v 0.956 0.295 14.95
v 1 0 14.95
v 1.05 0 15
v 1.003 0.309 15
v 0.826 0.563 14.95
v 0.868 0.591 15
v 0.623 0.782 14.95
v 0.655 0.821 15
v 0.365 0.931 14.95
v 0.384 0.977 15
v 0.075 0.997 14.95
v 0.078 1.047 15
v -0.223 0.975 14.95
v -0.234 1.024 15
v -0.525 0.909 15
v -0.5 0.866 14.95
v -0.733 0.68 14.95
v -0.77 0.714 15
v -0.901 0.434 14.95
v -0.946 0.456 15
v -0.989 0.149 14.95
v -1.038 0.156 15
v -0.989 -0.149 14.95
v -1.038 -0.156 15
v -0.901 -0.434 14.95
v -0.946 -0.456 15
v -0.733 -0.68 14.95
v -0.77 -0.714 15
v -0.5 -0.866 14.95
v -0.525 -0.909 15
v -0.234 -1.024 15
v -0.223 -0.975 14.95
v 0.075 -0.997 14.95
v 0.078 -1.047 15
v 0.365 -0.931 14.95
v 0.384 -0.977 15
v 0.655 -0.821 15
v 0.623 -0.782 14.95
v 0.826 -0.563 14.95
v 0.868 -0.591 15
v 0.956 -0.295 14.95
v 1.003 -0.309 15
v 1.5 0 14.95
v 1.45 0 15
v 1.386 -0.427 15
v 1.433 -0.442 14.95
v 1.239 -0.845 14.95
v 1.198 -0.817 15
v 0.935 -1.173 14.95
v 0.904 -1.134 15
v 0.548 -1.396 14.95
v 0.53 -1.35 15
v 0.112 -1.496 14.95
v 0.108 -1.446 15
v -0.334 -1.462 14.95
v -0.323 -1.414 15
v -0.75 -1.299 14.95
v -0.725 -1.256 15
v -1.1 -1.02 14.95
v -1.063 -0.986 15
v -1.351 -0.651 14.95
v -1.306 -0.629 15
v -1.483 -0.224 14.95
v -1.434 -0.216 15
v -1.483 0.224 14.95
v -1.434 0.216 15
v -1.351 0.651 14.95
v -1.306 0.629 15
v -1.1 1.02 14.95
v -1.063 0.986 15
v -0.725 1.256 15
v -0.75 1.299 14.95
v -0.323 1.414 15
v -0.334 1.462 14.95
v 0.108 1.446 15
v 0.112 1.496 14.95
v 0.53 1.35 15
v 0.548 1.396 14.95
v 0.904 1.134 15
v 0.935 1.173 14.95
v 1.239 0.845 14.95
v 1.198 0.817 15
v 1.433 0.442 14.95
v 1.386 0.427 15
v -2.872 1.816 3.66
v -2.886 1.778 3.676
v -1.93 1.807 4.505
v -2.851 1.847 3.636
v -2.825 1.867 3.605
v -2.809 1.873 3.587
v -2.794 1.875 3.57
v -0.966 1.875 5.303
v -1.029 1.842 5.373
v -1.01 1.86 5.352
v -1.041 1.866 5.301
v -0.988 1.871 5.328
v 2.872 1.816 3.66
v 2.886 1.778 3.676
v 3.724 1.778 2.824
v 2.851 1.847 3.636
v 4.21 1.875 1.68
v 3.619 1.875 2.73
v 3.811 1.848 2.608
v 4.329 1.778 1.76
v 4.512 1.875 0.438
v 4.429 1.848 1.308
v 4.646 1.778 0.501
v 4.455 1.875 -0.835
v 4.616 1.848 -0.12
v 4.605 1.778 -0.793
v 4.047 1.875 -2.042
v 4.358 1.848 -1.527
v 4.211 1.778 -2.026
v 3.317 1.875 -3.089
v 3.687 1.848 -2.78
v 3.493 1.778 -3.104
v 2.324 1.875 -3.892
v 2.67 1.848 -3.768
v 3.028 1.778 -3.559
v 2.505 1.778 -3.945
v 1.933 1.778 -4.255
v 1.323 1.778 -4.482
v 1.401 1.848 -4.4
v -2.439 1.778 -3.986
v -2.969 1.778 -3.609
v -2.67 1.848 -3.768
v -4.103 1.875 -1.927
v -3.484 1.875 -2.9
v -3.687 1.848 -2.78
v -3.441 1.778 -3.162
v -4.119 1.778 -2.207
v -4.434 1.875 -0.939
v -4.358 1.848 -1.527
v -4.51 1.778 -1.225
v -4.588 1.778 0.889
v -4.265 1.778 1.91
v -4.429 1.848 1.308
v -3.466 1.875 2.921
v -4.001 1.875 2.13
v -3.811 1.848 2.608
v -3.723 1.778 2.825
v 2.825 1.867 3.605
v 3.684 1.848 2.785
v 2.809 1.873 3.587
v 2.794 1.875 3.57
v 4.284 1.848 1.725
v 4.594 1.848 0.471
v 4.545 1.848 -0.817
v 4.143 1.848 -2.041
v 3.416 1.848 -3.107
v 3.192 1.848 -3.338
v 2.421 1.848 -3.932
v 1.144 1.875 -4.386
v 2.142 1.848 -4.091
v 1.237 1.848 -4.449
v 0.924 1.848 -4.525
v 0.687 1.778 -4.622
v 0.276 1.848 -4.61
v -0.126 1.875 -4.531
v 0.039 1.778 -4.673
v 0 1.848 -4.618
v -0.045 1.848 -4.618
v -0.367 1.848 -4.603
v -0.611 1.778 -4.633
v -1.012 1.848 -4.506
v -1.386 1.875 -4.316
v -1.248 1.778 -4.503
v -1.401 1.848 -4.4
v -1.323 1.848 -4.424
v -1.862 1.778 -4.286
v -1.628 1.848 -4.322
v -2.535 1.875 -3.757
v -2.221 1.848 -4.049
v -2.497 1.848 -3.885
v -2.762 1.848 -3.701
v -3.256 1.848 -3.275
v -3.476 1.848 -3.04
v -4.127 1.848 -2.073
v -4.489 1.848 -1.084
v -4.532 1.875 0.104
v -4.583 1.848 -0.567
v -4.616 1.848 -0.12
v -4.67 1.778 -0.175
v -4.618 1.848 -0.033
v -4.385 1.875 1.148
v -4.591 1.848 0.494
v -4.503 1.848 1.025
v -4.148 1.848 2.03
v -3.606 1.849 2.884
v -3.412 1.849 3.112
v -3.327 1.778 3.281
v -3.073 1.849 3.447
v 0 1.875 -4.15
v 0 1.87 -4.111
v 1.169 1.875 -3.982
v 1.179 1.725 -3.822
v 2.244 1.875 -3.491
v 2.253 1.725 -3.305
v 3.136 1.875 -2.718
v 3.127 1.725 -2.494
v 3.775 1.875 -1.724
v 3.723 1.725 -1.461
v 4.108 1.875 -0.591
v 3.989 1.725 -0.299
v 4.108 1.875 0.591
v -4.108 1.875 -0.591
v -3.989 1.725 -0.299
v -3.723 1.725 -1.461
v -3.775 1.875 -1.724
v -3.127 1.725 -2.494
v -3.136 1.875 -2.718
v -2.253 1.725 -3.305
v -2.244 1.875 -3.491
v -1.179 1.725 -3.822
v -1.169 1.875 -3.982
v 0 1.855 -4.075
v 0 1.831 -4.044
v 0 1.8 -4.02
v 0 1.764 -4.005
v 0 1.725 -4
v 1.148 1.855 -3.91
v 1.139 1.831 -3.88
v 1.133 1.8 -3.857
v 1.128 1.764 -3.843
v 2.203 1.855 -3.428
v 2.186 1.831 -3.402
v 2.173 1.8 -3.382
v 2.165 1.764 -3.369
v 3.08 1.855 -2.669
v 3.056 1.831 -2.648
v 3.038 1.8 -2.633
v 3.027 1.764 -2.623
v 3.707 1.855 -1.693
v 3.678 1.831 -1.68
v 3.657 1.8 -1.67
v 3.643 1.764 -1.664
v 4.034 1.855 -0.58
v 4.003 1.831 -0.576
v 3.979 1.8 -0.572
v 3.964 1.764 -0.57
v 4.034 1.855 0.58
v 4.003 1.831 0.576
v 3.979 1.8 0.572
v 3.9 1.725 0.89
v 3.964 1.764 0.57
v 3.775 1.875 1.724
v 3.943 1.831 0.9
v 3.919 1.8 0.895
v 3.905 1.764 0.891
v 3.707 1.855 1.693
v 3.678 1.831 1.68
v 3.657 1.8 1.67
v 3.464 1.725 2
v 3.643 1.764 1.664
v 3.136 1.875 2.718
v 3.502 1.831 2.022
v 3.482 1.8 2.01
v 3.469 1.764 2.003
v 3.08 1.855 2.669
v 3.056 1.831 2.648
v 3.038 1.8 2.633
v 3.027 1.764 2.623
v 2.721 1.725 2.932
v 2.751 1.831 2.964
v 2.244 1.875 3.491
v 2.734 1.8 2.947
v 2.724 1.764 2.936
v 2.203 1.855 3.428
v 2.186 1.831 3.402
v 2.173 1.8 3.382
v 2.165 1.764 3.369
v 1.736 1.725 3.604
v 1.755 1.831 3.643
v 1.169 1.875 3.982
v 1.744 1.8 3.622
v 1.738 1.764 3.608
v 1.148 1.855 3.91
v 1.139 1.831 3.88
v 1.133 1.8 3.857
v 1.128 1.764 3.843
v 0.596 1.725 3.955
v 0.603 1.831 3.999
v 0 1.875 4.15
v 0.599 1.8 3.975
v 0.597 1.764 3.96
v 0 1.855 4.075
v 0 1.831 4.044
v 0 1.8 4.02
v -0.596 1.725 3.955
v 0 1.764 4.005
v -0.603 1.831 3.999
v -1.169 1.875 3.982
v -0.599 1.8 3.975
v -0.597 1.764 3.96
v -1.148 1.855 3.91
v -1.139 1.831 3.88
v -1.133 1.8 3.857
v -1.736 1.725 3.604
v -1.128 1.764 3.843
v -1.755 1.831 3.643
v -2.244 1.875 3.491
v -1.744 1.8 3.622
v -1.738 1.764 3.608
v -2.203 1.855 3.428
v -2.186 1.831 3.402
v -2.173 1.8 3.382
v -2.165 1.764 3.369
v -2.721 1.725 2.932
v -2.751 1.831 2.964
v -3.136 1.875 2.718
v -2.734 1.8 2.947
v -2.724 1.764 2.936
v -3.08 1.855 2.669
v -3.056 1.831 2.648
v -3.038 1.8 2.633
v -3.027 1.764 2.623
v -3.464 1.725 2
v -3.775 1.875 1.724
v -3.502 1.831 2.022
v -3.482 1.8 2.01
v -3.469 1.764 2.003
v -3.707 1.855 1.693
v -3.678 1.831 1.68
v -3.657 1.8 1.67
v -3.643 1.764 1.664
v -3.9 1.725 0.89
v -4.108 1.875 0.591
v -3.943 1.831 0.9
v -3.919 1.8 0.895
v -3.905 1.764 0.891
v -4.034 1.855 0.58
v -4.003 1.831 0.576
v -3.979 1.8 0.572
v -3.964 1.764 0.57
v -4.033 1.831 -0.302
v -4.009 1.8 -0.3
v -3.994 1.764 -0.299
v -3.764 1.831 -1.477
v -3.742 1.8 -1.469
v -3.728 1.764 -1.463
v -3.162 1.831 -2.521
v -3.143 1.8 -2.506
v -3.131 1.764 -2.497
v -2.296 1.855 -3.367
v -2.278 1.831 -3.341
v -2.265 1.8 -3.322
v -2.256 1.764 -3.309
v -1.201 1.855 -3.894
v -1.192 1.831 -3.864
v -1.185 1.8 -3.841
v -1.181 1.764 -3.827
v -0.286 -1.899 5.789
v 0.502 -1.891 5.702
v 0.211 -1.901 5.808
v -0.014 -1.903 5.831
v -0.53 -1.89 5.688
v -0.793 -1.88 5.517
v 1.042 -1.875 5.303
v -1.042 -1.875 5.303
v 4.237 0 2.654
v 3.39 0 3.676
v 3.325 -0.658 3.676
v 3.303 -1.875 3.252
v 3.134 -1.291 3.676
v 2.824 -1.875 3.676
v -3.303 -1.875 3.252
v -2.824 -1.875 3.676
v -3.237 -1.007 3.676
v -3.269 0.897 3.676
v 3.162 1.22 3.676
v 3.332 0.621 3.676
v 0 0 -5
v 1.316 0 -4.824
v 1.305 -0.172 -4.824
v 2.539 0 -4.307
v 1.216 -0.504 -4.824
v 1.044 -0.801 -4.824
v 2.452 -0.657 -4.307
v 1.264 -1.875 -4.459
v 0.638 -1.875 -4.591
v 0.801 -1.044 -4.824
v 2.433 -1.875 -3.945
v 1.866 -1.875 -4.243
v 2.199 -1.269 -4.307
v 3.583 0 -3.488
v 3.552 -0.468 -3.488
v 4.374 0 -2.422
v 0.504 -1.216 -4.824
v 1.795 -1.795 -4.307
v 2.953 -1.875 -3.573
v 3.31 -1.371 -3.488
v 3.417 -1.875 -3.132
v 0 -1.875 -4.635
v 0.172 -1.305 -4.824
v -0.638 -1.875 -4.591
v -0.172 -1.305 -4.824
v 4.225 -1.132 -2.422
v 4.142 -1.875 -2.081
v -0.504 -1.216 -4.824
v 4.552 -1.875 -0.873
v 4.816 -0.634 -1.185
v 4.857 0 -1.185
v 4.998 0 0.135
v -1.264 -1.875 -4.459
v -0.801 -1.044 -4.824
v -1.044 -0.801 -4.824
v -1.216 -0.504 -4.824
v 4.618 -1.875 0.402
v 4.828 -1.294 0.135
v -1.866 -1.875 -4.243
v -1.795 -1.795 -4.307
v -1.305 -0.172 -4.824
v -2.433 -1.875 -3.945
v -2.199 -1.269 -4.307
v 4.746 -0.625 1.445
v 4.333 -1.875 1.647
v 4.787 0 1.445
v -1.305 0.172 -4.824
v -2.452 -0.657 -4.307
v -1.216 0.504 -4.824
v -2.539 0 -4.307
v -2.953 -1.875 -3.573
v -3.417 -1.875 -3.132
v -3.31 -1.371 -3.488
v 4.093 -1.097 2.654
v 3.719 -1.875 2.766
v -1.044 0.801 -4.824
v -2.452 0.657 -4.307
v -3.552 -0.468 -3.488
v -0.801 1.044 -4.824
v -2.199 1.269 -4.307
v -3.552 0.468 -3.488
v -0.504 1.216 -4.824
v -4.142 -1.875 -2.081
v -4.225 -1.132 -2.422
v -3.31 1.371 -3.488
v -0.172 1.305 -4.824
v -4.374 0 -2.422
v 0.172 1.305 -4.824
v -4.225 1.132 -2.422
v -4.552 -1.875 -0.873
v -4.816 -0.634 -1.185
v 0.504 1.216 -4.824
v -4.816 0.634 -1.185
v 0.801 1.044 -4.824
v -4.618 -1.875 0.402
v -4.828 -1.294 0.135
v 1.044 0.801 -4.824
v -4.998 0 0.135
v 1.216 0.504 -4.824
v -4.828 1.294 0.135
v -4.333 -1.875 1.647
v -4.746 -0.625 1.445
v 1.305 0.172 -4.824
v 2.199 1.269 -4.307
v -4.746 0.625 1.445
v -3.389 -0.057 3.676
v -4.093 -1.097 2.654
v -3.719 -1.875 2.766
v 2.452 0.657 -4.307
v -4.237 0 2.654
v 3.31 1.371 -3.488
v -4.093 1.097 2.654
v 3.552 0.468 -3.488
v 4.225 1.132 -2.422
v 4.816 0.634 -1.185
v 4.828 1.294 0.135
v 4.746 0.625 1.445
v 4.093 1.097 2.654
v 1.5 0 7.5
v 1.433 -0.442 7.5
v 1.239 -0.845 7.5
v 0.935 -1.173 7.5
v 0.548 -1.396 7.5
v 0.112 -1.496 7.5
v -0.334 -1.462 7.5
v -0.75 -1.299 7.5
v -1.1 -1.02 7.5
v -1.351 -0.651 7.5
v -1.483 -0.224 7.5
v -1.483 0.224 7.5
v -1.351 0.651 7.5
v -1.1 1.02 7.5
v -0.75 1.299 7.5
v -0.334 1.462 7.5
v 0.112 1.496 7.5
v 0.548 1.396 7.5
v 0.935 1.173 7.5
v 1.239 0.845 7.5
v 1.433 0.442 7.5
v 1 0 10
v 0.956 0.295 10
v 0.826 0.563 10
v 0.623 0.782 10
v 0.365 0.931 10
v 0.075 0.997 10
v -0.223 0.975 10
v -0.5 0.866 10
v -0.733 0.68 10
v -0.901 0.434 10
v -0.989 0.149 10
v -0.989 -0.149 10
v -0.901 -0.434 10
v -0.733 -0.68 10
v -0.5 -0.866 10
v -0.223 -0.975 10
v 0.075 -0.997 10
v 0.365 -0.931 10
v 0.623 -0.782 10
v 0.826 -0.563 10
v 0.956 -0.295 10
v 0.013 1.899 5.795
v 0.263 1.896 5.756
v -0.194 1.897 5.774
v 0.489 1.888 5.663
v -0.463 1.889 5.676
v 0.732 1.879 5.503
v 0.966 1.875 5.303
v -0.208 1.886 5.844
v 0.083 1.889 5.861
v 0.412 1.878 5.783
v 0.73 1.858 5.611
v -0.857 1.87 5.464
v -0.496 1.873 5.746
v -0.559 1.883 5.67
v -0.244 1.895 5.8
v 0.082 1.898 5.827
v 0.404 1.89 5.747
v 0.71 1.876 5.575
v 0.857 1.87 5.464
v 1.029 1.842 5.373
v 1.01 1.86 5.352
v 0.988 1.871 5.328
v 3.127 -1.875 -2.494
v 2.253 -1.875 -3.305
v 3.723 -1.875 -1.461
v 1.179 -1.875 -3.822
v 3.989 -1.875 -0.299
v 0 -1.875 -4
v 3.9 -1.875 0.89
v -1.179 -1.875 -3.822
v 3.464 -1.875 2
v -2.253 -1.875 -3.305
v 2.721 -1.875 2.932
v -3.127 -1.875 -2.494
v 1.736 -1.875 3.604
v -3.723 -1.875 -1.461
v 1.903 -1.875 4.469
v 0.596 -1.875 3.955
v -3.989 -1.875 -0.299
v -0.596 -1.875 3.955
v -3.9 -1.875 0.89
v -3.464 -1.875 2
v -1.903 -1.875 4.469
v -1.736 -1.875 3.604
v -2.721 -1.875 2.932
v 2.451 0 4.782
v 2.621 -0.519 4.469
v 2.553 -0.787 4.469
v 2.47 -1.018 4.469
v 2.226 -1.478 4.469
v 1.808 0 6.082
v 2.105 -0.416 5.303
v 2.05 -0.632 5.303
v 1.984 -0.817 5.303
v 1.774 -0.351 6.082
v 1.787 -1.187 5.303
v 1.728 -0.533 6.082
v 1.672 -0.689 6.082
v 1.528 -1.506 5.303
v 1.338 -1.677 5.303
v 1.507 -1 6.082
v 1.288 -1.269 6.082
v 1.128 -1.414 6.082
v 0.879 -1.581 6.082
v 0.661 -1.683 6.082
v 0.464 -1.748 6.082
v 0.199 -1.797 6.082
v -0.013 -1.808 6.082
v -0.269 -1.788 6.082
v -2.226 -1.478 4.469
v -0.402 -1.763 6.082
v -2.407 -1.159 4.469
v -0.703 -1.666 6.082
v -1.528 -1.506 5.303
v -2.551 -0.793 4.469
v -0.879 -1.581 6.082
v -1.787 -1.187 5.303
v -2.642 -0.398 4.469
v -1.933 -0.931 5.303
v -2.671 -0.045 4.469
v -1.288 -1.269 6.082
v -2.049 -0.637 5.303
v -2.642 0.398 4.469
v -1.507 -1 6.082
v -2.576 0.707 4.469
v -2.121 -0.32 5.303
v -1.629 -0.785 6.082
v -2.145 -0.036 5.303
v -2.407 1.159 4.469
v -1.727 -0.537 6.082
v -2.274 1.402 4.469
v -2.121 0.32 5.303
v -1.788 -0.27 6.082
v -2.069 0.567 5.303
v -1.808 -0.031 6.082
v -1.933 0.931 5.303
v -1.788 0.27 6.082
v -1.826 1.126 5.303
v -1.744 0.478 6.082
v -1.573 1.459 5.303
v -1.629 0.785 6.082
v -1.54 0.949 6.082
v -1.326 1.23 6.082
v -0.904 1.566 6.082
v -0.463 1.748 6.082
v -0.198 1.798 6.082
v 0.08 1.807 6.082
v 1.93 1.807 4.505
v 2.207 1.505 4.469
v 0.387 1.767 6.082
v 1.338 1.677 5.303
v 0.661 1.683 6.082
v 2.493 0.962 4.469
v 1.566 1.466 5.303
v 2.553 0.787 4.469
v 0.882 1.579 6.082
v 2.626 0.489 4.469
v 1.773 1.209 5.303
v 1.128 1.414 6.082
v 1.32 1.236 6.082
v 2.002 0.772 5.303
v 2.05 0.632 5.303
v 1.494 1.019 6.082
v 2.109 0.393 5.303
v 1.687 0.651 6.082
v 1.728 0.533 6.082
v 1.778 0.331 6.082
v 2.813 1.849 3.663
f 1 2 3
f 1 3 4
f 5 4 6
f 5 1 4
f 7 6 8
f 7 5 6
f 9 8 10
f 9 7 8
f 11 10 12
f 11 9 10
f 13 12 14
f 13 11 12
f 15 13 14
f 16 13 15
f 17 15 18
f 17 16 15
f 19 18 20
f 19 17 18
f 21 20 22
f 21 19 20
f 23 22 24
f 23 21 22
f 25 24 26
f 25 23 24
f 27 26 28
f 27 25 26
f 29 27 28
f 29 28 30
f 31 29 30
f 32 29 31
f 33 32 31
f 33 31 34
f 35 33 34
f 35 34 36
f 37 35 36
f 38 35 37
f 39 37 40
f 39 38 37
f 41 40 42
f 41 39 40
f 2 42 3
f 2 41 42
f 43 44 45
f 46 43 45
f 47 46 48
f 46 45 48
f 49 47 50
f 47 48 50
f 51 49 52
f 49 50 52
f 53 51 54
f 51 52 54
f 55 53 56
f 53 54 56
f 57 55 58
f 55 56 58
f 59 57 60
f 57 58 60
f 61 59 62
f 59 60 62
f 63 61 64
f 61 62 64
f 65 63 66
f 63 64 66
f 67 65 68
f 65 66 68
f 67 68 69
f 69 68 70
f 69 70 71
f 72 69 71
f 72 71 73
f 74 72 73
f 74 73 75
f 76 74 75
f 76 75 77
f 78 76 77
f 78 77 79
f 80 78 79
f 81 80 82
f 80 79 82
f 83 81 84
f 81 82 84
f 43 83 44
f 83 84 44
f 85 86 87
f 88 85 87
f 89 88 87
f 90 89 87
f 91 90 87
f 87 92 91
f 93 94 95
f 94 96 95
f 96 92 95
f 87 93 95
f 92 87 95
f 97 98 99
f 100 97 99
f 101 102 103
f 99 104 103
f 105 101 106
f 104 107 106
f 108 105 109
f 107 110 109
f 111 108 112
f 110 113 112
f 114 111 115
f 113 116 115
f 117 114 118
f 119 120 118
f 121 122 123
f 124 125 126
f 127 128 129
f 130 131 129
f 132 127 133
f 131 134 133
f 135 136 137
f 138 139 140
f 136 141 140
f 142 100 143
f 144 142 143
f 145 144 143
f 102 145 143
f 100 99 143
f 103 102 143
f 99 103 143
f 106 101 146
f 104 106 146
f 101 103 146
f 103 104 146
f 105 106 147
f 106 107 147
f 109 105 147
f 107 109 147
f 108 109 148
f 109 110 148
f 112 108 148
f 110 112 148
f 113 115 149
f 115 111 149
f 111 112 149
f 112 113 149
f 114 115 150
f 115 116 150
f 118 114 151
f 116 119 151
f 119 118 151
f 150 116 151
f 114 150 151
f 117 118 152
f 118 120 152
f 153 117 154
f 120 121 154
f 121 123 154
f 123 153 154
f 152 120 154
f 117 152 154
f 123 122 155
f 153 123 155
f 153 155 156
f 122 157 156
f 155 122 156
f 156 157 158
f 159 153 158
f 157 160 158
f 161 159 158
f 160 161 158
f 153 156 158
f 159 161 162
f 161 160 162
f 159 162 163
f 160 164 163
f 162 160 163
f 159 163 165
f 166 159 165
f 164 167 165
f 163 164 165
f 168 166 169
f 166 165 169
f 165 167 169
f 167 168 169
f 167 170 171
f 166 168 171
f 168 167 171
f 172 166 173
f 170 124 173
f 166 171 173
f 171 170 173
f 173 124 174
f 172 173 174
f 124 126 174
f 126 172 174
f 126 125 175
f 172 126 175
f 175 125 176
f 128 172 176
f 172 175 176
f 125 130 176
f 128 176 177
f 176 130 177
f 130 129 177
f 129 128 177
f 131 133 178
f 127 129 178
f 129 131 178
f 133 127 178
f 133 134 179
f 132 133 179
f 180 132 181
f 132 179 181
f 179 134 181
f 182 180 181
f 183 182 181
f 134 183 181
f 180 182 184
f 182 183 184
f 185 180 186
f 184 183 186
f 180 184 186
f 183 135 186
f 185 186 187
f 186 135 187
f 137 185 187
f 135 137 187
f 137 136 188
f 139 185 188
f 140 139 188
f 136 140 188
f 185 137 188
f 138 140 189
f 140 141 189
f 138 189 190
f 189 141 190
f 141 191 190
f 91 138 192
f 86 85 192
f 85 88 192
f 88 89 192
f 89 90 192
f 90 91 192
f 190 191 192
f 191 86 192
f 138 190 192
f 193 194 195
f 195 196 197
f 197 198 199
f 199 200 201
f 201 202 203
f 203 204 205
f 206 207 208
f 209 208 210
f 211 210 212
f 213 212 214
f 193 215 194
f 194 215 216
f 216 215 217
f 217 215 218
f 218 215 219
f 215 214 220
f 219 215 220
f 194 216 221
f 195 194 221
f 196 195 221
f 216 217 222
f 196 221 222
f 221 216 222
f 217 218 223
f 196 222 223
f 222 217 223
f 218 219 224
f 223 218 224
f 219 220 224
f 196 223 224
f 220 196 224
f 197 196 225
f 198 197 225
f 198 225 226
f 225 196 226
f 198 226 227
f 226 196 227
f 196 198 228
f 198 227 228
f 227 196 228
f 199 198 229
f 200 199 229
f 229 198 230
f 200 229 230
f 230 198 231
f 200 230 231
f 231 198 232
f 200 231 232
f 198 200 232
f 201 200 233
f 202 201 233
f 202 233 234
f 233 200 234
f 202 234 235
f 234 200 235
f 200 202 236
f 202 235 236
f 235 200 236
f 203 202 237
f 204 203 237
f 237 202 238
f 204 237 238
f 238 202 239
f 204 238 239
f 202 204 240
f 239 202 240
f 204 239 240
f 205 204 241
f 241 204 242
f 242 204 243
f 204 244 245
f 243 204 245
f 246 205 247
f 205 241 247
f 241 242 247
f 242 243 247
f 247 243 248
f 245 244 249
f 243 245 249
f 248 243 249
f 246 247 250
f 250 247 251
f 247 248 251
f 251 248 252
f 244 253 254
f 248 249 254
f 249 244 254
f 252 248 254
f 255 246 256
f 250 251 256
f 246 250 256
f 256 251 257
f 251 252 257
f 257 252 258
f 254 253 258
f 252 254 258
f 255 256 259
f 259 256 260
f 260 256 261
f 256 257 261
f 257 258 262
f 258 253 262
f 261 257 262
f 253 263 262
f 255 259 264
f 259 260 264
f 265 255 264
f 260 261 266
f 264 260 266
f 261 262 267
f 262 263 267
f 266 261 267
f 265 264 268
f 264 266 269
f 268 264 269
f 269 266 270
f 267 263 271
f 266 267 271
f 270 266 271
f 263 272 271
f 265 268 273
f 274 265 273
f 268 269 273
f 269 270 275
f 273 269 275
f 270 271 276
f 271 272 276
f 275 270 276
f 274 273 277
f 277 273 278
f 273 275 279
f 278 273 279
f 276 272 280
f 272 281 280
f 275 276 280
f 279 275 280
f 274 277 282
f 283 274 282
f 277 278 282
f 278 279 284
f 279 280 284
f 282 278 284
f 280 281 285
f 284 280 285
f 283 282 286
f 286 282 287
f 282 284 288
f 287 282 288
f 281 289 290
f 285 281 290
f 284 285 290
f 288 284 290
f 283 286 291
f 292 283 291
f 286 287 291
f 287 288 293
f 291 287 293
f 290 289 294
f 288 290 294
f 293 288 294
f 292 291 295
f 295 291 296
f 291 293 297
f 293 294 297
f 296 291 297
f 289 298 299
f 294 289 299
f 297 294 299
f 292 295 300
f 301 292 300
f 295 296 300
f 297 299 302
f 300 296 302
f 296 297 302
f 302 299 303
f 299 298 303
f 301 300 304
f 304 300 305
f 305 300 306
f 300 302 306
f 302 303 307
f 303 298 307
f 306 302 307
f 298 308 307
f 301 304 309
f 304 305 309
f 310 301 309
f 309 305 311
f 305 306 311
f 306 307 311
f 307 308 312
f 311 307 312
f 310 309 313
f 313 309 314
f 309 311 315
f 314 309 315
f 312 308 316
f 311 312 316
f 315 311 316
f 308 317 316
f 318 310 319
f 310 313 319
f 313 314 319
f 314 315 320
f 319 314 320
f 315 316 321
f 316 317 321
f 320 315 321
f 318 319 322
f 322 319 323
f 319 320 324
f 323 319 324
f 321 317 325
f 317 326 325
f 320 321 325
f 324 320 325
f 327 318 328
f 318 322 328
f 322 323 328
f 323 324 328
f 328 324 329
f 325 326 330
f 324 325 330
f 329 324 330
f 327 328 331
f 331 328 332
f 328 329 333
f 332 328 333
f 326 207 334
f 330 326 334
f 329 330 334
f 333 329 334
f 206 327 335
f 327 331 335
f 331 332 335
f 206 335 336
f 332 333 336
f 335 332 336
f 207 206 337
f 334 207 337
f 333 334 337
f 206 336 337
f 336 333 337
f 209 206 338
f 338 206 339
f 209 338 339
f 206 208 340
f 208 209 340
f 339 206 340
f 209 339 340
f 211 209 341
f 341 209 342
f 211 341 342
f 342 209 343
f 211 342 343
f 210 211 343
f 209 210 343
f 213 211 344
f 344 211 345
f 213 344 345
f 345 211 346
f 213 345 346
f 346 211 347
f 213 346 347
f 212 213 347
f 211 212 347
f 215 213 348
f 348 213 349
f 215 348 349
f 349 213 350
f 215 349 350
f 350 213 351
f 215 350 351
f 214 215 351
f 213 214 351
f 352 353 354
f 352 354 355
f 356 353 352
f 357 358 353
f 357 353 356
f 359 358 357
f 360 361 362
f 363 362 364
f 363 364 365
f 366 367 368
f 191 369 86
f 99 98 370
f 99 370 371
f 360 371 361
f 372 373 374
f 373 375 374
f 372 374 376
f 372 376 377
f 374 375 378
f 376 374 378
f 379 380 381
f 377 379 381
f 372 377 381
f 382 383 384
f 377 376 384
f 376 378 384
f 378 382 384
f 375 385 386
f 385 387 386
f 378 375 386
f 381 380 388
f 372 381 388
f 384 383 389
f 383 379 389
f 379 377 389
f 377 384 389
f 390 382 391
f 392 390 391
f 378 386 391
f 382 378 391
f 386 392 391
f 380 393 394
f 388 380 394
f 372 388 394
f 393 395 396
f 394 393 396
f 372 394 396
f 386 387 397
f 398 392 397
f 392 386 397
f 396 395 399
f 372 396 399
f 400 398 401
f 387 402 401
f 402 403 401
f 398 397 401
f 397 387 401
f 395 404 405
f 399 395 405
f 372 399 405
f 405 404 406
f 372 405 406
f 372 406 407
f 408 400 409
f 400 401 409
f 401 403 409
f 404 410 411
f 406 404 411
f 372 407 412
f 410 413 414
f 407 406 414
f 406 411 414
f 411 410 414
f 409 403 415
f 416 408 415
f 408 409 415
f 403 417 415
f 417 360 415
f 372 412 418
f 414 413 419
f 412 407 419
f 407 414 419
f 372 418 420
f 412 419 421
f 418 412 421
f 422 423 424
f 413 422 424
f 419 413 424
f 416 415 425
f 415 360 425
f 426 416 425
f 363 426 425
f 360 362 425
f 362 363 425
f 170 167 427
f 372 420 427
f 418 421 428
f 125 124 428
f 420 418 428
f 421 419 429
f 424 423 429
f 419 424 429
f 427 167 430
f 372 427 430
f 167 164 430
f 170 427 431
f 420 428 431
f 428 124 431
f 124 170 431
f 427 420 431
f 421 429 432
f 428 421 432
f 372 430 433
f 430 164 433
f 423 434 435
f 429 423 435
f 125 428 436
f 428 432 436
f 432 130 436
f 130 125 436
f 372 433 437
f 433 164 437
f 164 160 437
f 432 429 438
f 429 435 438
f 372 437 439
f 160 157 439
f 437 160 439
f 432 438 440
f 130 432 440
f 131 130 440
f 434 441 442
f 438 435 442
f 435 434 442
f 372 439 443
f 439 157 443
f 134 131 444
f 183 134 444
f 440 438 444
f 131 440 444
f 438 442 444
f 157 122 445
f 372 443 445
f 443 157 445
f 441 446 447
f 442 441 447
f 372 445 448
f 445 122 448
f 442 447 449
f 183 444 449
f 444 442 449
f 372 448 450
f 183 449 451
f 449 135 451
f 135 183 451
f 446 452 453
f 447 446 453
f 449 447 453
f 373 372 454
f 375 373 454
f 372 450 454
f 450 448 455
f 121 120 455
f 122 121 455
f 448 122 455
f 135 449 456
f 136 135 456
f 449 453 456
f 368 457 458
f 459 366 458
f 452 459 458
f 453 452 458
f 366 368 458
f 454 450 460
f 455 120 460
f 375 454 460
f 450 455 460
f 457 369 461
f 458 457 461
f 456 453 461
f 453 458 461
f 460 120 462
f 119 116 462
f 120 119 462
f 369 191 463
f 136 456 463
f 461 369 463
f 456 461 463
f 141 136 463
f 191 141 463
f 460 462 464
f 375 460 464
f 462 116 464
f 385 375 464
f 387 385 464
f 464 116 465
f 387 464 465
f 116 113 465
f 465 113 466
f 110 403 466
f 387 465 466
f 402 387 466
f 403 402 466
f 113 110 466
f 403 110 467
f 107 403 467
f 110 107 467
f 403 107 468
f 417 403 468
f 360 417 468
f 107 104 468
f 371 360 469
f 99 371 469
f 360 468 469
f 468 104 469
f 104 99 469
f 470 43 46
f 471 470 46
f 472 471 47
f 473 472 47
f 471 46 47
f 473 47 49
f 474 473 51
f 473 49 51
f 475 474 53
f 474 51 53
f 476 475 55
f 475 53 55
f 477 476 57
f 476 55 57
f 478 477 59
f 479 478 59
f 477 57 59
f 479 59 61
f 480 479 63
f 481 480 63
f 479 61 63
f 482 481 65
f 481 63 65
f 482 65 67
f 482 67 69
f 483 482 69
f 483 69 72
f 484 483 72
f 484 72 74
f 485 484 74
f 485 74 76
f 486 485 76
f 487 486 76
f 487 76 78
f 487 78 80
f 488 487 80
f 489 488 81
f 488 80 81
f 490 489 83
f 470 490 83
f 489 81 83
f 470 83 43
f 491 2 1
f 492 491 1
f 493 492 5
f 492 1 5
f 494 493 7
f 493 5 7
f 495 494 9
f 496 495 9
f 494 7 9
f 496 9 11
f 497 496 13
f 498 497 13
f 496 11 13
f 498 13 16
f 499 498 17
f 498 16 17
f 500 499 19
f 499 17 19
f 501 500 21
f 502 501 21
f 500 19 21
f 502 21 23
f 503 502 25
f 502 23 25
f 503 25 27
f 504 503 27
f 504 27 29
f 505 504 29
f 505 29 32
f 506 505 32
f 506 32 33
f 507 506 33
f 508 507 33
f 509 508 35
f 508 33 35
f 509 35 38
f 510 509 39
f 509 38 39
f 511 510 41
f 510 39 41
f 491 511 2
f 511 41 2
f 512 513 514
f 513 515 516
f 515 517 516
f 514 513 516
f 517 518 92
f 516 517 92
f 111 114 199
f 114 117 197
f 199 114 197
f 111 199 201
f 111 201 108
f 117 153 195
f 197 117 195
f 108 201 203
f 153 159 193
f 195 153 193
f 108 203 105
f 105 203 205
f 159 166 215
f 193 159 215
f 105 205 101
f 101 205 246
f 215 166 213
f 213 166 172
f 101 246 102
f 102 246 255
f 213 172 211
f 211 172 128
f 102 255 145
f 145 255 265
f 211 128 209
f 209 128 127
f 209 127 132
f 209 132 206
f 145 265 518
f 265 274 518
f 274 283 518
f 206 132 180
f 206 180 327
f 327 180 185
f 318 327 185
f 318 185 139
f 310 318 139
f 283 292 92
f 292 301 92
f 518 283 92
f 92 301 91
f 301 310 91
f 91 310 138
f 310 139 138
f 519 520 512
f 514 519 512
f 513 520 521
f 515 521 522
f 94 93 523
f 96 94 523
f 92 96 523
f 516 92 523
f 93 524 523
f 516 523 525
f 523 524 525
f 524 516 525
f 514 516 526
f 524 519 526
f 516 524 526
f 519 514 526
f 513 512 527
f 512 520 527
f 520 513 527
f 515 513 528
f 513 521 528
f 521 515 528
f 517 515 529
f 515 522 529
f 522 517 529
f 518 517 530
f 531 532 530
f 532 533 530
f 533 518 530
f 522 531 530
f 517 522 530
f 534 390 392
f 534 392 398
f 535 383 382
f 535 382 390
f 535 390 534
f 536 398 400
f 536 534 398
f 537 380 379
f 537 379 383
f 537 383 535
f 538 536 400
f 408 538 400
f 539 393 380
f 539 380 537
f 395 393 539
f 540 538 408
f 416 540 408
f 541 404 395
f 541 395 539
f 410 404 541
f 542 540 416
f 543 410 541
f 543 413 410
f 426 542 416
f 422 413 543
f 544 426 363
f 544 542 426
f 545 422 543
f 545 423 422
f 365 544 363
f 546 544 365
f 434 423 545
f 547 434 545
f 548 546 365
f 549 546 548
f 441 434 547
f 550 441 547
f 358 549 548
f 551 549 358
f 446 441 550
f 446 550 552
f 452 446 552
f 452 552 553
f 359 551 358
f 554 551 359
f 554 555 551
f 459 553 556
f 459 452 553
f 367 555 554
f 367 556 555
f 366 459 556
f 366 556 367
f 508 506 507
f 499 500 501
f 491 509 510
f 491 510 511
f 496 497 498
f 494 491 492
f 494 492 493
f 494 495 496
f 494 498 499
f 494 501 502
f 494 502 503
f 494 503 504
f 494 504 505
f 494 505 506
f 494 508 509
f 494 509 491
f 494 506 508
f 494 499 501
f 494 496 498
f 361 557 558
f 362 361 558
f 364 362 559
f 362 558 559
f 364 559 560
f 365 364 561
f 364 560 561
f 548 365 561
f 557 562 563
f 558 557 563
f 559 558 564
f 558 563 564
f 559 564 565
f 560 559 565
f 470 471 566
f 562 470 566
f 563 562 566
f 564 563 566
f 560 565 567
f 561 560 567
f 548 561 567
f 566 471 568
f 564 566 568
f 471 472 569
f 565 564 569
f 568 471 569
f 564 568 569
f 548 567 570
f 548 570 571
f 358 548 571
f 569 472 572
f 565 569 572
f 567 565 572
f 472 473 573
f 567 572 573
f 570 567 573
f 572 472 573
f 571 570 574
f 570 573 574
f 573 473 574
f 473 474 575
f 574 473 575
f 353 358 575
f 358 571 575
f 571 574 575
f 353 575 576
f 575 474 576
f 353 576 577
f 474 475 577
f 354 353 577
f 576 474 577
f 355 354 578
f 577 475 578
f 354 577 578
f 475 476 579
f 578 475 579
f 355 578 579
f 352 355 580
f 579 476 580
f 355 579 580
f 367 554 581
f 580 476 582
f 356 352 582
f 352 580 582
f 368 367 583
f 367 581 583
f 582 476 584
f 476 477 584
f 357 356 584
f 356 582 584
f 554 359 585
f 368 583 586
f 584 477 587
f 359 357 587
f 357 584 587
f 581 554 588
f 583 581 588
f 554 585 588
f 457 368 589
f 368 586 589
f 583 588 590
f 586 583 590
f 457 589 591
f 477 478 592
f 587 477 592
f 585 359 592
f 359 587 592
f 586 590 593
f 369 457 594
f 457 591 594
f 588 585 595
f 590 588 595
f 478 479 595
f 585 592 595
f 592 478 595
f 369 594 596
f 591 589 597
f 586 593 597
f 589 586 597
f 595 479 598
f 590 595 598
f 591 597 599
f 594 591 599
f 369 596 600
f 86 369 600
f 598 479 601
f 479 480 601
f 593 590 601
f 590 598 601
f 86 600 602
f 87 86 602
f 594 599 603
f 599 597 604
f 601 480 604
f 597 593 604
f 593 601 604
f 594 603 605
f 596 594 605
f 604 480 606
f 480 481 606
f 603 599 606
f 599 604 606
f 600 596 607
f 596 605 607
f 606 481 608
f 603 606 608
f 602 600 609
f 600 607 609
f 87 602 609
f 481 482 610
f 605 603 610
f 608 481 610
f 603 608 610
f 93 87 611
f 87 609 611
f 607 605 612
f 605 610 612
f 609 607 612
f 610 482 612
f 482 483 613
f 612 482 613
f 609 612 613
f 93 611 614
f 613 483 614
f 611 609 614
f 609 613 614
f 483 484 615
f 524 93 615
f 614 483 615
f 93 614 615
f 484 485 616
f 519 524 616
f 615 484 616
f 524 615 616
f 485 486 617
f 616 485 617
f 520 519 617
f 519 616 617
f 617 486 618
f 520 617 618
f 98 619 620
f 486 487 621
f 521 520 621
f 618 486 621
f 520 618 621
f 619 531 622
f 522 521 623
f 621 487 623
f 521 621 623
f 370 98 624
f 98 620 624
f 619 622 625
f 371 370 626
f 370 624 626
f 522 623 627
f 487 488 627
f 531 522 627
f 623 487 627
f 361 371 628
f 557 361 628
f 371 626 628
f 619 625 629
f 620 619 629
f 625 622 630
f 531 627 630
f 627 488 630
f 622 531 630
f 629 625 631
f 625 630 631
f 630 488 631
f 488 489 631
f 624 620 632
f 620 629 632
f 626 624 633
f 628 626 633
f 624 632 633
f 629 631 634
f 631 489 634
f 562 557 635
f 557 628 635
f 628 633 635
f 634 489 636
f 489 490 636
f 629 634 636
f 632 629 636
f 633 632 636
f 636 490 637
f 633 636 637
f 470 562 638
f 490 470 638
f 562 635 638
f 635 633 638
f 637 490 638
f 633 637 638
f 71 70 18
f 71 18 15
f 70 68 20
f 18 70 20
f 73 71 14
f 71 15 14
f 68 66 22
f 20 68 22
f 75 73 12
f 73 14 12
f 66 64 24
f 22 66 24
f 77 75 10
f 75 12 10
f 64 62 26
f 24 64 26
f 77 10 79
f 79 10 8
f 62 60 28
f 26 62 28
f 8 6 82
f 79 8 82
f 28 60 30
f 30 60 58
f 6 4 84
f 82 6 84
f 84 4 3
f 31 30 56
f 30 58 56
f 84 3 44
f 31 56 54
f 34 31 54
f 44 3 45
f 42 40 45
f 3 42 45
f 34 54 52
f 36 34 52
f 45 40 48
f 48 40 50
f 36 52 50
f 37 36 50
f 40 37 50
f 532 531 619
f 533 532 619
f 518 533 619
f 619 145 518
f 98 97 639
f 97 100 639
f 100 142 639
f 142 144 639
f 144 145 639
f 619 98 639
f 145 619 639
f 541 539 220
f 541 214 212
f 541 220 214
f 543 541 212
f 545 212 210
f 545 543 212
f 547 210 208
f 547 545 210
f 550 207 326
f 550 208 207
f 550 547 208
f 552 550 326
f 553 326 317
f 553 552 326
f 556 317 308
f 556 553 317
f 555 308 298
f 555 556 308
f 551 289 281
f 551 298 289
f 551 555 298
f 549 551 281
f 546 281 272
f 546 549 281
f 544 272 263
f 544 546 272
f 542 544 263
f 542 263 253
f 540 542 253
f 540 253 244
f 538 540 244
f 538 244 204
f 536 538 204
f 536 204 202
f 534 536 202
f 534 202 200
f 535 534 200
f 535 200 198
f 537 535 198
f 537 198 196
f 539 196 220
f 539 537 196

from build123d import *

# Parameters (mm, degrees)
CUT_EXTRUDE3_DEPTH      = 10
CUT_EXTRUDE3_DEPTH_BACK = 10
CUT_EXTRUDE4_DEPTH      = 10
CUT_EXTRUDE4_DEPTH_BACK = 10
SKETCH7_R               = 4
FILLET1_R               = 0.15
SKETCH8_R               = 1
CUT_EXTRUDE5_DEPTH      = 5
CHAMFER1_SIZE           = 0.05


with BuildPart() as part:
    # Sketch5 → Revolve2 (revolve)
    with BuildSketch(Plane(origin=(0, 0, 0), x_dir=(1, 0, 0), z_dir=(0, 1, 0))):
        with BuildLine():
            Line((-1.5, -15), (0, -15))
            Line((0, -15), (0, 5))
            ThreePointArc((0, 5), (-4.657160695, 1.819575298), (-3.389621823, -3.675658294))
            ThreePointArc((-3.389621823, -3.675658294), (-2.089993468, -5.412512495), (-1.5, -7.5))
            Line((-1.5, -7.5), (-1.5, -15))
        make_face()
    revolve(axis=Axis((0, 0, 15), (0, 0, -1)))

    # Sketch6 → Cut-Extrude3 (cut, two sides: drawn at the far end of the back side and taken through both)
    with BuildSketch(Plane(origin=(0, 0, 0), x_dir=(0, 0, -1), z_dir=(1, 0, 0)).offset(-CUT_EXTRUDE3_DEPTH_BACK)):
        with BuildLine():
            Line((-19.567307599, 10.758838429), (14.902121045, 10.758838429))
            Line((14.902121045, 10.758838429), (14.902121045, 1.875))
            Line((14.902121045, 1.875), (-5.303377511, 1.875))
            ThreePointArc((-5.303377511, 1.875), (-6.806906508, 2.106415246), (-8.171259692, 2.779239779))
            Line((-8.171259692, 2.779239779), (-19.567307599, 10.758838429))
        make_face()
        with BuildLine():
            Line((-8.171259692, -2.779239779), (-19.567307599, -10.758838429))
            Line((-19.567307599, -10.758838429), (14.902121045, -10.758838429))
            Line((14.902121045, -10.758838429), (14.902121045, -1.875))
            Line((14.902121045, -1.875), (-5.303377511, -1.875))
            ThreePointArc((-5.303377511, -1.875), (-6.806906508, -2.106415246), (-8.171259692, -2.779239779))
        make_face()
    extrude(amount=CUT_EXTRUDE3_DEPTH + CUT_EXTRUDE3_DEPTH_BACK, mode=Mode.SUBTRACT)

    # Sketch7 → Cut-Extrude4 (cut, two sides: drawn at the far end of the back side and taken through both)
    with BuildSketch(Plane(origin=(0, 0, 0), x_dir=(1, 0, 0), z_dir=(0, 1, 0)).offset(-CUT_EXTRUDE4_DEPTH_BACK)):
        Circle(SKETCH7_R)
    extrude(amount=CUT_EXTRUDE4_DEPTH + CUT_EXTRUDE4_DEPTH_BACK, mode=Mode.SUBTRACT)

    # Fillet1
    fillet1_edges = [part.edges().sort_by_distance(p)[0] for p in [
        (-4, 1.875, 0),
        (1.909227576, 1.875, 4.46296456),
        (-1e-09, 1.902919108, 5.831024745),
        (-1.909227576, 1.875, 4.46296456),
        (0, 1.875, -4.635124054),
    ]]
    fillet(fillet1_edges, radius=FILLET1_R)

    # Sketch8 → Cut-Extrude5 (cut)
    with BuildSketch(Plane.XY.offset(15)):
        Circle(SKETCH8_R)
    extrude(amount=-CUT_EXTRUDE5_DEPTH, mode=Mode.SUBTRACT)

    # Chamfer1
    chamfer1_edges = [part.edges().sort_by_distance(p)[0] for p in [
        (1.5, 0, 15),
        (-1, 0, 15),
    ]]
    chamfer(chamfer1_edges, length=CHAMFER1_SIZE)


solid = part.part
